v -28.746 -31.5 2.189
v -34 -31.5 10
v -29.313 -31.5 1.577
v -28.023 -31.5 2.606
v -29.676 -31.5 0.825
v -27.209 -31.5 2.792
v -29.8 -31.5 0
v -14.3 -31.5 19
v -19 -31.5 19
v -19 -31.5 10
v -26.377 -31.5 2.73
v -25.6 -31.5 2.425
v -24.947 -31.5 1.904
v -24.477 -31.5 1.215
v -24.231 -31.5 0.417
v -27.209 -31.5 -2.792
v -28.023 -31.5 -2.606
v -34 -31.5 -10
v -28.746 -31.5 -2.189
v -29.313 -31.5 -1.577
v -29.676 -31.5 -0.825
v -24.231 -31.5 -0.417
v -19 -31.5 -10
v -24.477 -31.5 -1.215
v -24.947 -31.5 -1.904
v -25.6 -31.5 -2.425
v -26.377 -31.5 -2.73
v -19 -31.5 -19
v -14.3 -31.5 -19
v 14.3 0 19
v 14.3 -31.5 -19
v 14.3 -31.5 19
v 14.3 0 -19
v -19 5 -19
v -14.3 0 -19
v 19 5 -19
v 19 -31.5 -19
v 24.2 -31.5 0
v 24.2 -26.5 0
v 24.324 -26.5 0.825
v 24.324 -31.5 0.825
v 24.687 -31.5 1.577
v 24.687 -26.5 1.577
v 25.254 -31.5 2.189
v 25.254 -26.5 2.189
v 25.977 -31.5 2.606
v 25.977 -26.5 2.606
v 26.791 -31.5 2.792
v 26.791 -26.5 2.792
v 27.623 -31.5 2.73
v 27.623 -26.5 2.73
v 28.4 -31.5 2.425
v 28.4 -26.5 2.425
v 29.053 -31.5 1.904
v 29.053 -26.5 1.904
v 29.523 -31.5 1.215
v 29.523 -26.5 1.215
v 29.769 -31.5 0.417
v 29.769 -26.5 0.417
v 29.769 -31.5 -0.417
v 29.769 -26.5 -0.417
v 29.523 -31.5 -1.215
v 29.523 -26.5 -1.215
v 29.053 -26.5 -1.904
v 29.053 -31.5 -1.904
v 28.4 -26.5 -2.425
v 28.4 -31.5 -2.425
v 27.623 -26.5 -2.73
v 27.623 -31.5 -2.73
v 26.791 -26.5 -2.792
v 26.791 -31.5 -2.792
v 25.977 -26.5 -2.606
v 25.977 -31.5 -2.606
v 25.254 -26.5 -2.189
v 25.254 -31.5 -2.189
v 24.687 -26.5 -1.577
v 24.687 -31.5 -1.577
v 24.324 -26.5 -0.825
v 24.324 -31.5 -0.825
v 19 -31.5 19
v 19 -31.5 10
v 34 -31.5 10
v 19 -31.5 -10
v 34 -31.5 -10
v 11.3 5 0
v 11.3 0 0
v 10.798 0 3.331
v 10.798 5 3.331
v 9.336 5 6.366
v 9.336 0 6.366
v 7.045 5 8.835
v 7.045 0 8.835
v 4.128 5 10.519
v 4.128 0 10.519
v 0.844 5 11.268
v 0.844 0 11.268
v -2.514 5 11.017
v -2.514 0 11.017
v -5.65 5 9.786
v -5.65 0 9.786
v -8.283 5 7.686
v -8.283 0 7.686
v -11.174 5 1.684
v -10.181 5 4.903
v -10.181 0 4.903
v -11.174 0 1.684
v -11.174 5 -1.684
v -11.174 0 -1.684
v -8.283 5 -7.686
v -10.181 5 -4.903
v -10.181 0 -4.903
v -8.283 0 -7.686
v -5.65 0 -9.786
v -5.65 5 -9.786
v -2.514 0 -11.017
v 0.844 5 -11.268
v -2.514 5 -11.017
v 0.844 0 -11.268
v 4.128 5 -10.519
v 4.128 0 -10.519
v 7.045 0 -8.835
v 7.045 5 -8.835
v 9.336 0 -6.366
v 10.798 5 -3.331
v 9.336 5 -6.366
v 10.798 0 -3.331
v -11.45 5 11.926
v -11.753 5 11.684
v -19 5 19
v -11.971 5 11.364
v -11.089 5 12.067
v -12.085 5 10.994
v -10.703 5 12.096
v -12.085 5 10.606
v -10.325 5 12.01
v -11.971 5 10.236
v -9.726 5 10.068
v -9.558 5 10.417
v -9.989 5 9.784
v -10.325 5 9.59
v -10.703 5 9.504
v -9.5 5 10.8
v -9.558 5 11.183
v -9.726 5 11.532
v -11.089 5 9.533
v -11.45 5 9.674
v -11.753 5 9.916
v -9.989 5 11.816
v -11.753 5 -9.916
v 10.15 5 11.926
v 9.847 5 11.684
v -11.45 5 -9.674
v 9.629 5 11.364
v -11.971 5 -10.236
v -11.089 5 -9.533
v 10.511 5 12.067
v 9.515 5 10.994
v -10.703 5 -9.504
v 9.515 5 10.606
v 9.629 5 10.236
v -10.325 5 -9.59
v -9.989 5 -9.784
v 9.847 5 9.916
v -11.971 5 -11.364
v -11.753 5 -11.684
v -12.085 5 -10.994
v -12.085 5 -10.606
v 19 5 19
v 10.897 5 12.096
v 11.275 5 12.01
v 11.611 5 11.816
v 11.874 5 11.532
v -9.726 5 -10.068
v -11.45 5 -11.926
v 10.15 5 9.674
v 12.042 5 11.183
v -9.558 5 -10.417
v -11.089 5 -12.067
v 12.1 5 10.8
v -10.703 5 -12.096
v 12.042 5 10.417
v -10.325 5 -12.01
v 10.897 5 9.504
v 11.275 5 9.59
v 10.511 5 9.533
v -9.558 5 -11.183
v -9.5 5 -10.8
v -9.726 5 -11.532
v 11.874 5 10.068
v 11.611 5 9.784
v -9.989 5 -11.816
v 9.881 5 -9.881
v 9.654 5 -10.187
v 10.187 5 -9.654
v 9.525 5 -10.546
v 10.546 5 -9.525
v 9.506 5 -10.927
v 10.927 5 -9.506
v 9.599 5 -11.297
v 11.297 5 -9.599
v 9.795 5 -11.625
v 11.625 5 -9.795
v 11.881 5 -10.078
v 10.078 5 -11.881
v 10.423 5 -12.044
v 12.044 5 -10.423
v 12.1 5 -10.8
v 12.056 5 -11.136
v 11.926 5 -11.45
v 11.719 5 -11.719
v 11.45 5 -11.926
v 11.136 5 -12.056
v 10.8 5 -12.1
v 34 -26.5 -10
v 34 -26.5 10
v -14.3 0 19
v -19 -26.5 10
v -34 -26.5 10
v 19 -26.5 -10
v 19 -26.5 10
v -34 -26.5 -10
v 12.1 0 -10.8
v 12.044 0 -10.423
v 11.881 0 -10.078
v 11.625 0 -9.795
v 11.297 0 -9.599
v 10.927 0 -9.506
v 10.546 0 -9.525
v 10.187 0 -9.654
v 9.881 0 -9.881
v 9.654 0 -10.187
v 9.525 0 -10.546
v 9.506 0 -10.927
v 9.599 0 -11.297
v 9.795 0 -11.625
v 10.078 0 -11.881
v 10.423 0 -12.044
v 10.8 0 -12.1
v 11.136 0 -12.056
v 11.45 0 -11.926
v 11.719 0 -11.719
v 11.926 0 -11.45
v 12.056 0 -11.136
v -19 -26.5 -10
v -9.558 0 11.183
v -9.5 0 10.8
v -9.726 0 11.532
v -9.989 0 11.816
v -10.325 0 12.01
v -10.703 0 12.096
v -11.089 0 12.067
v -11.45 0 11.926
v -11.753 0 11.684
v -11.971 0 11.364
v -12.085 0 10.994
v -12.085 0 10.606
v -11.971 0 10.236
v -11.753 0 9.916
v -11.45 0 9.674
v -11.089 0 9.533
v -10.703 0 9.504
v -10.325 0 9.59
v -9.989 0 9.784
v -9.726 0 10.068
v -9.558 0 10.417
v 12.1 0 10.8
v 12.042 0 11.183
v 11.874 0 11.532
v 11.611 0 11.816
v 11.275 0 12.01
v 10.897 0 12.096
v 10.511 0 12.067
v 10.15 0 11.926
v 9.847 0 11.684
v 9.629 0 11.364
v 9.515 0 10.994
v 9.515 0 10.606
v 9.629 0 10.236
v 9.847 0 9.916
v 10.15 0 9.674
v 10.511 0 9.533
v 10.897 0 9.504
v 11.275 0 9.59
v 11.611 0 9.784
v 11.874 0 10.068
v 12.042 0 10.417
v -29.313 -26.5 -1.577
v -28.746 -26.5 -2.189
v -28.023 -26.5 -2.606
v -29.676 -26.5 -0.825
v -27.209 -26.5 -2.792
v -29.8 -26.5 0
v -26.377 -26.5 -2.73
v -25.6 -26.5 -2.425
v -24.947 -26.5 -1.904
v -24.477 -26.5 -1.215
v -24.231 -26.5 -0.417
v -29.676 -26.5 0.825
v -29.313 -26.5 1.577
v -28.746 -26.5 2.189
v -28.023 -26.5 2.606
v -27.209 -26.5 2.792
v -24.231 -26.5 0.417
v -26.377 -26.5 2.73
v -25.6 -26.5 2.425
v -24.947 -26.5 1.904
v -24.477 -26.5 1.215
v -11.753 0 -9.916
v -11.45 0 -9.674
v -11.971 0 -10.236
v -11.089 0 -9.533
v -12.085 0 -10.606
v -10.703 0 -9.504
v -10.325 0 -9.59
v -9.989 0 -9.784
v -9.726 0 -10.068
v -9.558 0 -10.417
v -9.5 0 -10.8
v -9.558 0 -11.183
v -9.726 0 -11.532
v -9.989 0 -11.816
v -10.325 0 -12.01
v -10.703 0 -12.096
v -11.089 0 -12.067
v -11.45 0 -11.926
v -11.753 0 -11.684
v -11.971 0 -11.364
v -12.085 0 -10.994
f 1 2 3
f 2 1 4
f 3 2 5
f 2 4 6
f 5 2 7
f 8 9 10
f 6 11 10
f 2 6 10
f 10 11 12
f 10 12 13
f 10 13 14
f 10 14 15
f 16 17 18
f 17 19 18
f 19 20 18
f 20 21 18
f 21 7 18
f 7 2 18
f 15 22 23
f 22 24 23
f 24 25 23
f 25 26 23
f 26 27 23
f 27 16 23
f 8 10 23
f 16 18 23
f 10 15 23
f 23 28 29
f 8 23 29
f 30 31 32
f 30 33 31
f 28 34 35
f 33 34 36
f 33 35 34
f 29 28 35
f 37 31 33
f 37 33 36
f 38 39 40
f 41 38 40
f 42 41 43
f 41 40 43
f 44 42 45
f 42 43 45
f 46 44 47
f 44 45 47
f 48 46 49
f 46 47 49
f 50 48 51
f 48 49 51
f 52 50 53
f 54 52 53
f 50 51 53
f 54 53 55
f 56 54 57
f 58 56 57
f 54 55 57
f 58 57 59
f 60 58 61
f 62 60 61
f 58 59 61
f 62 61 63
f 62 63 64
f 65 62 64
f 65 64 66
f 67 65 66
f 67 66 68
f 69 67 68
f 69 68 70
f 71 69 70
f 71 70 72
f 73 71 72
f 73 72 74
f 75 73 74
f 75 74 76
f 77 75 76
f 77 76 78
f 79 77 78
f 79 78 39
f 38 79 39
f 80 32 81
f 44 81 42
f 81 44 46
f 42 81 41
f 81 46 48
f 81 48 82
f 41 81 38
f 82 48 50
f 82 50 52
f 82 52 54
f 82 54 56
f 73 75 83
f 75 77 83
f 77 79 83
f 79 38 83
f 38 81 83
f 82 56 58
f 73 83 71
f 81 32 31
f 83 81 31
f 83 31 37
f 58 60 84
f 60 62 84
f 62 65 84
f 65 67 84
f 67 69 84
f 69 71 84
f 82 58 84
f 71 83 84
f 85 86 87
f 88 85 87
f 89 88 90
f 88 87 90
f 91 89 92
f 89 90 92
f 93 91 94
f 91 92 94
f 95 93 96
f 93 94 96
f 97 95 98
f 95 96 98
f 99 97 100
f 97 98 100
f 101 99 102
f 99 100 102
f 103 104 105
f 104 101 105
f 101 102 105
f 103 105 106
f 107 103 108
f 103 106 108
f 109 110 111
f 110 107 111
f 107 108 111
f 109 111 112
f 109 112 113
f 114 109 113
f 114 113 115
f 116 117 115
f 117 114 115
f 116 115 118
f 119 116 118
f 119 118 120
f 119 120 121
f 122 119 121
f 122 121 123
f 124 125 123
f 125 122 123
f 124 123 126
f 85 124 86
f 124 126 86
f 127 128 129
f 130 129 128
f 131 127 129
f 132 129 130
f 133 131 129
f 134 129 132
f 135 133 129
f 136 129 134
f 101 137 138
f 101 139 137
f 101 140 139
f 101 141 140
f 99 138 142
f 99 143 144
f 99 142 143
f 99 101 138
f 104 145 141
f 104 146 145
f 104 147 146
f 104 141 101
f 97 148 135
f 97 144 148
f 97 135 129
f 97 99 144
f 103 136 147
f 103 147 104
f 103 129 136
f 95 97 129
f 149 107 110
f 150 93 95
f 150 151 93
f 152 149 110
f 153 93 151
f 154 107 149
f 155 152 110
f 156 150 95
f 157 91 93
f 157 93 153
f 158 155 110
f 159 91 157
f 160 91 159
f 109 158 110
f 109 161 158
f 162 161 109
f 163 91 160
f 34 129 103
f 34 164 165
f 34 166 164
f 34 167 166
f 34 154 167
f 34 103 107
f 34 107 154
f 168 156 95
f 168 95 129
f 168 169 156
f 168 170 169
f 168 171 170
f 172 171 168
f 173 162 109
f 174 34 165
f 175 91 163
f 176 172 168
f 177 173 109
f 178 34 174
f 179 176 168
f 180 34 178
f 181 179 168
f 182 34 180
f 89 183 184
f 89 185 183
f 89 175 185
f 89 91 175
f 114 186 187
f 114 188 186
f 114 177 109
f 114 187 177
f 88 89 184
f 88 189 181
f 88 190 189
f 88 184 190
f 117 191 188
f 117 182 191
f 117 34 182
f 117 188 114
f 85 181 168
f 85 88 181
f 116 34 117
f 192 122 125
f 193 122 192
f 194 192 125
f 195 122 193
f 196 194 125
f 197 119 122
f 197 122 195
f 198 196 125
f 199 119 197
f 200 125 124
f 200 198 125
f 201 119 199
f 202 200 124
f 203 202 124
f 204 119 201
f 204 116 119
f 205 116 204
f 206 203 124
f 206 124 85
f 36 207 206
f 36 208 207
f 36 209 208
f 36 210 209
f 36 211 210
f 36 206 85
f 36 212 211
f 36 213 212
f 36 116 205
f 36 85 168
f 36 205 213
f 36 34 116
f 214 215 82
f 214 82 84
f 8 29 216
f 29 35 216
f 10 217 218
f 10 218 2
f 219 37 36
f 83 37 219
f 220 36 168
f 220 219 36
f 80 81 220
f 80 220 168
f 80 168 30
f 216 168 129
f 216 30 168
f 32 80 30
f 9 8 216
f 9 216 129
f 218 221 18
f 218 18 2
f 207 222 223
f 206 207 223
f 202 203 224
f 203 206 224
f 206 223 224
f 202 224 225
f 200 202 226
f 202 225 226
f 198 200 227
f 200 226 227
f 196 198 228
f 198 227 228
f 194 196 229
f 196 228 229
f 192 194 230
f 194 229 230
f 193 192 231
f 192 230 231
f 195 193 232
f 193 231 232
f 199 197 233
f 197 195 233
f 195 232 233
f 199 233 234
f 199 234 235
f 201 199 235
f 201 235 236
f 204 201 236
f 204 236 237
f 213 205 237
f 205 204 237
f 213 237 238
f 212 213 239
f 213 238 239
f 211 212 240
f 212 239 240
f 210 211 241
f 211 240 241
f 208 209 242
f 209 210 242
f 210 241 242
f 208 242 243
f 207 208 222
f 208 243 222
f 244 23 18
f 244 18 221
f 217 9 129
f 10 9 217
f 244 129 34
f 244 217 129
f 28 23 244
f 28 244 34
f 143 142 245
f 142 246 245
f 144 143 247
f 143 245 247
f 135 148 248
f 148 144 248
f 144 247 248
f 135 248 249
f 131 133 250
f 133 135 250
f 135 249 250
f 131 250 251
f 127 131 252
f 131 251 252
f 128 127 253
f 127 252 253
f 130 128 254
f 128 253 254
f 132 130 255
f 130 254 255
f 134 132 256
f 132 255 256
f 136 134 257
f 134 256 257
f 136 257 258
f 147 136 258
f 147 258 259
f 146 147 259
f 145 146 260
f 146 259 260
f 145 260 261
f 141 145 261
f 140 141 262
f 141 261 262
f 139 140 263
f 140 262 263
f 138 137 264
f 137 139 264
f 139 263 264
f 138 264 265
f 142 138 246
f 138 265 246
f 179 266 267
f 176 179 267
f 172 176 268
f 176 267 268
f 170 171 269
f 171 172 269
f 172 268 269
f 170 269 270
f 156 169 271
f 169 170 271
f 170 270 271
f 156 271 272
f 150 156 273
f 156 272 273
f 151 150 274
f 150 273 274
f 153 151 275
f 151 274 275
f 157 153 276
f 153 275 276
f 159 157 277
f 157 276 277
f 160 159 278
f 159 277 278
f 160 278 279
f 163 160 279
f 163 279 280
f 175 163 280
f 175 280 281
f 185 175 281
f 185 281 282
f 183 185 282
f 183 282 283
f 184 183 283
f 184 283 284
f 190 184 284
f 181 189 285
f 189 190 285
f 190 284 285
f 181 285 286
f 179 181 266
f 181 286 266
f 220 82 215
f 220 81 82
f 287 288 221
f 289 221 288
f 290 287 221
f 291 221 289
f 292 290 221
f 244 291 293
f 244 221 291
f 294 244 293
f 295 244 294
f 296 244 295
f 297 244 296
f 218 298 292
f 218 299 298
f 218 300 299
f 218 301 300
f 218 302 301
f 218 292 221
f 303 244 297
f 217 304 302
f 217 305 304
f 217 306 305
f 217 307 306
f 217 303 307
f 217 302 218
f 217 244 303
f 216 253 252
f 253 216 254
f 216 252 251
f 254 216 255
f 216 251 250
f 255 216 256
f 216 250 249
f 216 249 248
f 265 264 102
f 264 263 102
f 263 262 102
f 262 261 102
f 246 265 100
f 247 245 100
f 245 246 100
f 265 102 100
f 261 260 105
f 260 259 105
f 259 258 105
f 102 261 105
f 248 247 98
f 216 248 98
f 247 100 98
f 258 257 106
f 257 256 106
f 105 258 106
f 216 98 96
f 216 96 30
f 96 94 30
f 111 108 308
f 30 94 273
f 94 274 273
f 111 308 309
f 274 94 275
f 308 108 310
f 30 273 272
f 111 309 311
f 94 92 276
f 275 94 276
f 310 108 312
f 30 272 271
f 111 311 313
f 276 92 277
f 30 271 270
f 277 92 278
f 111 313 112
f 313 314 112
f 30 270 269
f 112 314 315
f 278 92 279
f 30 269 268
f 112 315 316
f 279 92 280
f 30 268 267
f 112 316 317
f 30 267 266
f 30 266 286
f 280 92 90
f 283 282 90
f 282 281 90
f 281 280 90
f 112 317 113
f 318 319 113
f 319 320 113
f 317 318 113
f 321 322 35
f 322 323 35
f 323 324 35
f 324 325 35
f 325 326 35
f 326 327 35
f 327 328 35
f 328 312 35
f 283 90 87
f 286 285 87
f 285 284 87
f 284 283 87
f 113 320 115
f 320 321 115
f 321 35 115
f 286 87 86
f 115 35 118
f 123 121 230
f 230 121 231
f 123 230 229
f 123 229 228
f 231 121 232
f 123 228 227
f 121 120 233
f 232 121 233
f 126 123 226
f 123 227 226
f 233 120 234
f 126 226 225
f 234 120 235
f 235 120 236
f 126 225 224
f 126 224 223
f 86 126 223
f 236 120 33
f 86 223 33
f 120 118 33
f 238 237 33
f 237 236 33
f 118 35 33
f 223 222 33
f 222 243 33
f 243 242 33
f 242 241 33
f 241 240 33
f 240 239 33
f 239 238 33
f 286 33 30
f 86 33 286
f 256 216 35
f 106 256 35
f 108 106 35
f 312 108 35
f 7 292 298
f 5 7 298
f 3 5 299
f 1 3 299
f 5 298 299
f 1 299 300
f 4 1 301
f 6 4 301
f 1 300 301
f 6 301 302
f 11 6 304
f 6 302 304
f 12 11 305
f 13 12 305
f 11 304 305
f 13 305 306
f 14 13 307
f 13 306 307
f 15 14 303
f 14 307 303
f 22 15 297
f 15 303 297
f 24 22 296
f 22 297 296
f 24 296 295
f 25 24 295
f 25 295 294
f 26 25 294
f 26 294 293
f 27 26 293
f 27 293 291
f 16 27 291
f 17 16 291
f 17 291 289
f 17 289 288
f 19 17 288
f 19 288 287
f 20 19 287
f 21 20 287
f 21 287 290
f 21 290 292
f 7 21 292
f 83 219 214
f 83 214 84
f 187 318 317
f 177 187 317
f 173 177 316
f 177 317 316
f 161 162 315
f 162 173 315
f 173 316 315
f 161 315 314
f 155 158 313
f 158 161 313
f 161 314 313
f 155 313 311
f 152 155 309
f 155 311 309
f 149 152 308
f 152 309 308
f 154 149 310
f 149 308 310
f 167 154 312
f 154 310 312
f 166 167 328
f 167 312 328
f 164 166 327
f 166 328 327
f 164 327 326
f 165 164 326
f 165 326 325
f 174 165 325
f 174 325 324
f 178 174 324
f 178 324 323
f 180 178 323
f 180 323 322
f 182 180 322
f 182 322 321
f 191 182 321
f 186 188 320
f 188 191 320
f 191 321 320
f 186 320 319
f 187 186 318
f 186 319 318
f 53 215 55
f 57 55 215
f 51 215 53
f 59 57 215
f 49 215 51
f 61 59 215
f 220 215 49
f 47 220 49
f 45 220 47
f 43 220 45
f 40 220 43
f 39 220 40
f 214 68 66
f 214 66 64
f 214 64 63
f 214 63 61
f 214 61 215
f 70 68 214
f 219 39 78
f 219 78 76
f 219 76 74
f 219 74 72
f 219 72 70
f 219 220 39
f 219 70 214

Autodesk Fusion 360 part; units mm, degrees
sketch "Sketch1" plane through (0, 0, 0) normal (0, 1, 0) x (1, 0, 0)
  line L0 (14, 14) -> (-14, 14)
  line L1 (-14, 14) -> (-14, -14)
  line L2 (-14, -14) -> (14, -14)
  line L3 (14, -14) -> (14, 14)
  line L4 (14, 14) -> (-14, -14) construction
  line L5 (-14, 14) -> (14, -14) construction
  line L6 (14, 14) -> (10.8, 14)
  line L7 (10.8, 14) -> (10.8, 10.8)
  circle A0 centre (10.8, 10.8) radius 1.3
  circle A1 centre (-10.8, 10.8) radius 1.3
  circle A2 centre (-10.8, -10.8) radius 1.3
  circle A3 centre (10.8, -10.8) radius 1.3
  line L8 (-19, 19) -> (19, 19)
  line L9 (19, 19) -> (19, -19)
  line L10 (19, -19) -> (-19, -19)
  line L11 (-19, -19) -> (-19, 19)
  line L12 (-19, 19) -> (19, -19) construction
  line L13 (19, 19) -> (-19, -19) construction
  circle A4 centre (0, 0) radius 11.3
  dimension "d1" = 28
  dimension "d2" = 28
  dimension "d3" = 3.2
  dimension "d4" = 3.2
  dimension "d5" = 2.6
  dimension "d7" = 360
  dimension "d8" = 38
  dimension "d9" = 38
  dimension "d10" = 22.6
extrude "Extrude1" add sketch "Sketch1" along normal blind 5 contours L0 L1 L2 L3 L6 | L8 L9 L10 L11
sketch "Sketch2" plane through (0, 0, 0) normal (0, 1, 0) x (1, 0, 0)
  circle A0 centre (10.8, 10.8) radius 1.3
  circle A1 centre (0, 0) radius 11.3
  circle A2 centre (10.8, -10.8) radius 1.3
  circle A3 centre (-10.8, -10.8) radius 1.3
  circle A4 centre (-10.8, 10.8) radius 1.3
  line L0 (19, -19) -> (-19, -19)
  line L1 (-19, -19) -> (-19, 19)
  line L2 (-19, 19) -> (19, 19)
  line L3 (19, 19) -> (19, -19)
  line L4 (14, 19) -> (14, -19)
  line L5 (-14, 19) -> (-14, -19)
  point P0 (-14, -14)
  point P1 (14, -14)
  point P2 (14, 14)
  point P3 (-14, 14)
extrude "Extrude2" add sketch "Sketch2" against normal blind 31.5 contours L0 L2 L3 L4 | L0 L1 L2 L5
extrude "Extrude3" cut 1 faces at (-14, -10.5, -6.3333) along direction (-1, 0, 0) blind 0.3
extrude "Extrude4" cut 1 faces at (14, -10.5, -6.3333) along direction (1, 0, 0) blind 0.3
sketch "Sketch3" plane through (-19, 0, 0) normal (-1, 0, 0) x (0, 0, 1)
  line L0 (19, -31.5) -> (19, 5)
  line L1 (19, 5) -> (-19, 5)
  line L2 (-19, 5) -> (-19, -31.5)
  line L3 (-19, -31.5) -> (19, -31.5)
  line L4 (0, -31.5) -> (-10, -31.5)
  line L5 (0, -31.5) -> (10, -31.5)
  line L6 (10, -31.5) -> (-10, -31.5)
  line L7 (-10, -31.5) -> (-10, -26.5)
  line L8 (-10, -26.5) -> (10, -26.5)
  line L9 (10, -26.5) -> (10, -31.5)
  dimension "d19" = 10
  dimension "d20" = 20
  dimension "d21" = 5
extrude "Extrude5" add sketch "Sketch3" along normal blind 15 contours L3 L4 L5 L6 L7 L8 L9
sketch "Sketch4" plane through (0, -26.5, 0) normal (0, 1, 0) x (-1, 0, 0)
  line L0 (19, 10) -> (19, -10)
  line L1 (19, -10) -> (34, -10)
  line L2 (34, -10) -> (34, 10)
  line L3 (34, 10) -> (19, 10)
  line L4 (34, 0) -> (27, 0)
  circle A0 centre (27, 0) radius 2.8
  dimension "d24" = 7
  dimension "d25" = 5.6
sketch "Sketch5" plane through (19, 0, 0) normal (1, 0, 0) x (0, 0, -1)
  line L0 (19, -31.5) -> (19, 5)
  line L1 (19, 5) -> (-19, 5)
  line L2 (-19, 5) -> (-19, -31.5)
  line L3 (-19, -31.5) -> (19, -31.5)
  line L4 (0, -31.5) -> (10, -31.5)
  line L5 (10, -31.5) -> (-10, -31.5)
  line L6 (-10, -31.5) -> (-10, -26.5)
  line L7 (-10, -26.5) -> (10, -26.5)
  line L8 (10, -26.5) -> (10, -31.5)
  dimension "d26" = 10
  dimension "d27" = 20
  dimension "d28" = 5
extrude "Extrude6" add sketch "Sketch5" along normal blind 15 contours L3 L4 L5 L6 L7 L8
sketch "Sketch6" plane through (0, -26.5, 0) normal (0, 1, 0) x (-1, 0, 0)
  line L0 (-19, -10) -> (-19, 10)
  line L1 (-19, 10) -> (-34, 10)
  line L2 (-34, 10) -> (-34, -10)
  line L3 (-34, -10) -> (-19, -10)
  line L4 (-34, 0) -> (-27, 0)
  circle A0 centre (-27, 0) radius 2.8
  dimension "d31" = 7
  dimension "d32" = 5.6
extrude "Extrude7" cut sketch "Sketch4" sketch "Sketch6" against normal blind 11 contours A0 of sketch 2 contours A0
